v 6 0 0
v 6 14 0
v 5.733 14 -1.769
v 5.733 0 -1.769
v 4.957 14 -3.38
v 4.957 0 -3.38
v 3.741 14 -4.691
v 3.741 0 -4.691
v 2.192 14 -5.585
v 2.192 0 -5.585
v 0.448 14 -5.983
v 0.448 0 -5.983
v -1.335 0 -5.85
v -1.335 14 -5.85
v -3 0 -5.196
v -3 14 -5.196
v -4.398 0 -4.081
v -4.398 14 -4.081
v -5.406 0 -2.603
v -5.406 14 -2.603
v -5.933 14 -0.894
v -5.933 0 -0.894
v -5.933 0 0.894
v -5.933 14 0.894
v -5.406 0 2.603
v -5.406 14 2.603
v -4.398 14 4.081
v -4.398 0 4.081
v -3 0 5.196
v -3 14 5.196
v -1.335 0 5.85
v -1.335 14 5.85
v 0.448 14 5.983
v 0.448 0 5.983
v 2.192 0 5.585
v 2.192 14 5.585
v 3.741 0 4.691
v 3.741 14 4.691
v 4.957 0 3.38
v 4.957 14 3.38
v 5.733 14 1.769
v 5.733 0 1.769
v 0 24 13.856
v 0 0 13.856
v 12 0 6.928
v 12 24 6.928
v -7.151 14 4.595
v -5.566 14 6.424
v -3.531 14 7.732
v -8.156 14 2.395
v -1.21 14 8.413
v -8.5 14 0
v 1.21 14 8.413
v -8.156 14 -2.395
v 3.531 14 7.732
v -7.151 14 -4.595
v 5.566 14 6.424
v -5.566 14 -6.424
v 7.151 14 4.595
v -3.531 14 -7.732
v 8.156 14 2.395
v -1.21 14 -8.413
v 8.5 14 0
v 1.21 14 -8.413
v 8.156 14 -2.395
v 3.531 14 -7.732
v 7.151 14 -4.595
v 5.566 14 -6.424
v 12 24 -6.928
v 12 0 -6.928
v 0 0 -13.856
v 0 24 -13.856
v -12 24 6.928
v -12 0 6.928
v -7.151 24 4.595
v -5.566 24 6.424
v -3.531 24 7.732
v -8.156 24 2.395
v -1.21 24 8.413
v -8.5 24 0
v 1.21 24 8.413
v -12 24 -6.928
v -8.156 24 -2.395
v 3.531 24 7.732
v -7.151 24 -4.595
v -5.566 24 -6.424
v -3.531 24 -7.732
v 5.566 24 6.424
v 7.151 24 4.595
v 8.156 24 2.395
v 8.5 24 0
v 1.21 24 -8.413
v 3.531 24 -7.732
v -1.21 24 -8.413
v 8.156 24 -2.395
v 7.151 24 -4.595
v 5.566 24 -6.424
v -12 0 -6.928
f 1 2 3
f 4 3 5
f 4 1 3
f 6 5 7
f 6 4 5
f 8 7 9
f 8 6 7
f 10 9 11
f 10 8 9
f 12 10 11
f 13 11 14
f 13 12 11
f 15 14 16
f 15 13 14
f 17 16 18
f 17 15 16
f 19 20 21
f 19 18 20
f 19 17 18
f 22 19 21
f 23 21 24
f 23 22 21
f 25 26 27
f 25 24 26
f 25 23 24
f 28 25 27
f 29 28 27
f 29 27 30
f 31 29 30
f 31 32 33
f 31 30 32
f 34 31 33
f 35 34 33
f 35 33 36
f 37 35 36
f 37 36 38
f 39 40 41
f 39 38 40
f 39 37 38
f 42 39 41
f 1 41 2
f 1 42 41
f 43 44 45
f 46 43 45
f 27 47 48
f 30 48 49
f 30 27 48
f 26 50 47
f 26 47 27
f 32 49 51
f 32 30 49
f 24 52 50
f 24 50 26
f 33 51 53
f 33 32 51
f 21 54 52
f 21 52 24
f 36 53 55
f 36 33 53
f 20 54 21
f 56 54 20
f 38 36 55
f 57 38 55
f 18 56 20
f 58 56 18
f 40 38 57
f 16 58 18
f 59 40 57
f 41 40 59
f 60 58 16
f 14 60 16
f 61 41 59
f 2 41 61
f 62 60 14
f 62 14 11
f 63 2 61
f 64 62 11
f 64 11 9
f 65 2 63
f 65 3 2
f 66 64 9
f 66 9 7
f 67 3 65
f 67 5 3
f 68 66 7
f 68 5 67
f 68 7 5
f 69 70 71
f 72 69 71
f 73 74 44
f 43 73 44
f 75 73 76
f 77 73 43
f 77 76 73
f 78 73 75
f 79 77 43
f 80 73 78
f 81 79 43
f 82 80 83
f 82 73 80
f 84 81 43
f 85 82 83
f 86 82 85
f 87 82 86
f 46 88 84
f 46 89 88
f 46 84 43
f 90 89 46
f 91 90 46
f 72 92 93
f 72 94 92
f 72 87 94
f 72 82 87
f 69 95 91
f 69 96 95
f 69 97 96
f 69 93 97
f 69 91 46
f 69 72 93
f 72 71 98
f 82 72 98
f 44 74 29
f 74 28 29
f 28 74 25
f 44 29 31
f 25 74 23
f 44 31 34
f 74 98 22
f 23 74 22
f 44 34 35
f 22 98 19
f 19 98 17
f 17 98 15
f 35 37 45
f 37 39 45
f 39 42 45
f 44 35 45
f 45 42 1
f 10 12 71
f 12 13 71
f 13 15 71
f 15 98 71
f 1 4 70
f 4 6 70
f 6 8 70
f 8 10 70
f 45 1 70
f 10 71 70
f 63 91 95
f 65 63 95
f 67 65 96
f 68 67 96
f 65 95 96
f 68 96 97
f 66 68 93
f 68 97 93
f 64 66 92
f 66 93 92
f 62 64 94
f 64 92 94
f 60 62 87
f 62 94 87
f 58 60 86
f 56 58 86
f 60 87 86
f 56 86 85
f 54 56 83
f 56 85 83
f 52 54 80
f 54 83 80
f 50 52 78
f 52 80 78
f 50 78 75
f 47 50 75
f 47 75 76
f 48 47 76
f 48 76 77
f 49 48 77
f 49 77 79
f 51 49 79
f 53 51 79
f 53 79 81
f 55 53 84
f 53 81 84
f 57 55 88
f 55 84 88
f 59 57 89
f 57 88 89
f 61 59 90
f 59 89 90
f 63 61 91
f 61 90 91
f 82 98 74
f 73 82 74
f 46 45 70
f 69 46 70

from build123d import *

# Parameters (mm, degrees)
SKETCH_1_R          = 6
EXTRUDE_1_DEPTH     = 24
SKETCH_3_R          = 8.5
CUT_EXTRUDE_2_DEPTH = 10


with BuildPart() as part:
    # Эскиз1 → Бобышка-Вытянуть1 (new body)
    with BuildSketch(Plane(origin=(0, 0, 0), x_dir=(1, 0, 0), z_dir=(0, 1, 0))):
        Polygon((0, 13.856406461), (-12, 6.92820323), (-12, -6.92820323), (0, -13.856406461), (12, -6.92820323), (12, 6.92820323), align=None)
        Circle(SKETCH_1_R, mode=Mode.SUBTRACT)
    extrude(amount=EXTRUDE_1_DEPTH)

    # Эскиз3 → Вырез-Вытянуть2 (cut)
    with BuildSketch(Plane(origin=(0, 24, 0), x_dir=(1, 0, 0), z_dir=(0, 1, 0))):
        Circle(SKETCH_3_R)
    extrude(amount=-CUT_EXTRUDE_2_DEPTH, mode=Mode.SUBTRACT)


solid = part.part
